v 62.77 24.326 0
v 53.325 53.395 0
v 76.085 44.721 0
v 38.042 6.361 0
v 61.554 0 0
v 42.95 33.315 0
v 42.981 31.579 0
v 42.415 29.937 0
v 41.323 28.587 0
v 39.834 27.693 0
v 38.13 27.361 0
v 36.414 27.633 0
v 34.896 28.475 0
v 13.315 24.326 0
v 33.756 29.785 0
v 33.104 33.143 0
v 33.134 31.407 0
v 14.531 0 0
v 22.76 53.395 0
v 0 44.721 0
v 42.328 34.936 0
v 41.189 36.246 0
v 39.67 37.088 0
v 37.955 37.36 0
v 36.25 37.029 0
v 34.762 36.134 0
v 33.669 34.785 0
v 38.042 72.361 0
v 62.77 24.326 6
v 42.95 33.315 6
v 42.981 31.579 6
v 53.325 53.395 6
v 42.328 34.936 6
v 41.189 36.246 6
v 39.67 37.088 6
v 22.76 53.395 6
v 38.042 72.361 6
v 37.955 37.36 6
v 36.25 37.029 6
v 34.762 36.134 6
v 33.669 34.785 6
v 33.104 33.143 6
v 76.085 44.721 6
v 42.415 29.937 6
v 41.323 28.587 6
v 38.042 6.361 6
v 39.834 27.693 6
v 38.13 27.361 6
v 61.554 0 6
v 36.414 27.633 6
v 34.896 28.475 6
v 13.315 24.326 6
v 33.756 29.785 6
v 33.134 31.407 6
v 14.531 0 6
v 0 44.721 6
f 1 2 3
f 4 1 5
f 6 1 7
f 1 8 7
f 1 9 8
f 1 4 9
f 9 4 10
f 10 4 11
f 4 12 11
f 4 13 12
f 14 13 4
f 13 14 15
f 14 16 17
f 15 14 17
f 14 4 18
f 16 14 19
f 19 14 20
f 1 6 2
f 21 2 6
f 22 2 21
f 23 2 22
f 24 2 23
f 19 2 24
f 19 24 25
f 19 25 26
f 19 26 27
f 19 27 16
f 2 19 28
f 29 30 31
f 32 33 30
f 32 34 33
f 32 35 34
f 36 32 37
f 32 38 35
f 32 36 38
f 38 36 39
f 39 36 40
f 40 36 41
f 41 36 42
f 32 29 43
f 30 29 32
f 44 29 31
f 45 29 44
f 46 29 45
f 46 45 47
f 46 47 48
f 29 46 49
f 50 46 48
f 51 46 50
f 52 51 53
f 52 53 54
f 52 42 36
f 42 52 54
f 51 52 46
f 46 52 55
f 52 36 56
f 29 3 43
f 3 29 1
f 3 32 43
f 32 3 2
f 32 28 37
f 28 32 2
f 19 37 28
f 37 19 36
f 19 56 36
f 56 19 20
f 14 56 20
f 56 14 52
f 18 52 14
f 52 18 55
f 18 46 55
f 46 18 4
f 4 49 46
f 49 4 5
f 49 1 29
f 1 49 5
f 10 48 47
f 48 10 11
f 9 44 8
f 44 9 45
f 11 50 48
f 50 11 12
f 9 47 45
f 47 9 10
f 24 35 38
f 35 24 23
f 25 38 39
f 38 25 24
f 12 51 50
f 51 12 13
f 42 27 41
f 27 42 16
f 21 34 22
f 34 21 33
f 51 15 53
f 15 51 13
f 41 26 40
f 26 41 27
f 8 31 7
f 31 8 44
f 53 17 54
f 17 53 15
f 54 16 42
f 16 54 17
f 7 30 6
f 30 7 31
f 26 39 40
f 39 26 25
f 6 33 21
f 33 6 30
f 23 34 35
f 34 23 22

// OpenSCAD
$fn = 32;

// ----------------------------------------------------------------------
// Star wheel: 5-point blunt, R40
// ----------------------------------------------------------------------

// --- parameters (mm) ---
n_points = 5;             // number of points / teeth
r_out = 40;               // tip radius
r_in = 26;                // root radius
bore_r = 5;               // centre bore radius
plate_t = 6;              // plate thickness, Z (extrusion height)
bore_d = 10;              // centre bore diameter

profile = [[38.042, 72.361], [22.76, 53.395], [0, 44.721], [13.315, 24.326], [14.531, 0], [38.042, 6.361], [61.554, 0], [62.77, 24.326], [76.085, 44.721], [53.325, 53.395]];  // primary outline, 10 points, counter clockwise
void_1 = [[42.95, 33.315], [42.328, 34.936], [41.189, 36.246], [39.67, 37.088], [37.955, 37.36], [36.25, 37.029], [34.762, 36.134], [33.669, 34.785], [33.104, 33.143], [33.134, 31.407], [33.756, 29.785], [34.896, 28.475], [36.414, 27.633], [38.13, 27.361], [39.834, 27.693], [41.323, 28.587], [42.415, 29.937], [42.981, 31.579]];  // centre bore, 18 points

// --- the one profile operation ---
difference() {
  linear_extrude(height = plate_t) polygon(points = profile);
  translate([0, 0, -1])
    linear_extrude(height = plate_t + 2) polygon(points = void_1);
}
